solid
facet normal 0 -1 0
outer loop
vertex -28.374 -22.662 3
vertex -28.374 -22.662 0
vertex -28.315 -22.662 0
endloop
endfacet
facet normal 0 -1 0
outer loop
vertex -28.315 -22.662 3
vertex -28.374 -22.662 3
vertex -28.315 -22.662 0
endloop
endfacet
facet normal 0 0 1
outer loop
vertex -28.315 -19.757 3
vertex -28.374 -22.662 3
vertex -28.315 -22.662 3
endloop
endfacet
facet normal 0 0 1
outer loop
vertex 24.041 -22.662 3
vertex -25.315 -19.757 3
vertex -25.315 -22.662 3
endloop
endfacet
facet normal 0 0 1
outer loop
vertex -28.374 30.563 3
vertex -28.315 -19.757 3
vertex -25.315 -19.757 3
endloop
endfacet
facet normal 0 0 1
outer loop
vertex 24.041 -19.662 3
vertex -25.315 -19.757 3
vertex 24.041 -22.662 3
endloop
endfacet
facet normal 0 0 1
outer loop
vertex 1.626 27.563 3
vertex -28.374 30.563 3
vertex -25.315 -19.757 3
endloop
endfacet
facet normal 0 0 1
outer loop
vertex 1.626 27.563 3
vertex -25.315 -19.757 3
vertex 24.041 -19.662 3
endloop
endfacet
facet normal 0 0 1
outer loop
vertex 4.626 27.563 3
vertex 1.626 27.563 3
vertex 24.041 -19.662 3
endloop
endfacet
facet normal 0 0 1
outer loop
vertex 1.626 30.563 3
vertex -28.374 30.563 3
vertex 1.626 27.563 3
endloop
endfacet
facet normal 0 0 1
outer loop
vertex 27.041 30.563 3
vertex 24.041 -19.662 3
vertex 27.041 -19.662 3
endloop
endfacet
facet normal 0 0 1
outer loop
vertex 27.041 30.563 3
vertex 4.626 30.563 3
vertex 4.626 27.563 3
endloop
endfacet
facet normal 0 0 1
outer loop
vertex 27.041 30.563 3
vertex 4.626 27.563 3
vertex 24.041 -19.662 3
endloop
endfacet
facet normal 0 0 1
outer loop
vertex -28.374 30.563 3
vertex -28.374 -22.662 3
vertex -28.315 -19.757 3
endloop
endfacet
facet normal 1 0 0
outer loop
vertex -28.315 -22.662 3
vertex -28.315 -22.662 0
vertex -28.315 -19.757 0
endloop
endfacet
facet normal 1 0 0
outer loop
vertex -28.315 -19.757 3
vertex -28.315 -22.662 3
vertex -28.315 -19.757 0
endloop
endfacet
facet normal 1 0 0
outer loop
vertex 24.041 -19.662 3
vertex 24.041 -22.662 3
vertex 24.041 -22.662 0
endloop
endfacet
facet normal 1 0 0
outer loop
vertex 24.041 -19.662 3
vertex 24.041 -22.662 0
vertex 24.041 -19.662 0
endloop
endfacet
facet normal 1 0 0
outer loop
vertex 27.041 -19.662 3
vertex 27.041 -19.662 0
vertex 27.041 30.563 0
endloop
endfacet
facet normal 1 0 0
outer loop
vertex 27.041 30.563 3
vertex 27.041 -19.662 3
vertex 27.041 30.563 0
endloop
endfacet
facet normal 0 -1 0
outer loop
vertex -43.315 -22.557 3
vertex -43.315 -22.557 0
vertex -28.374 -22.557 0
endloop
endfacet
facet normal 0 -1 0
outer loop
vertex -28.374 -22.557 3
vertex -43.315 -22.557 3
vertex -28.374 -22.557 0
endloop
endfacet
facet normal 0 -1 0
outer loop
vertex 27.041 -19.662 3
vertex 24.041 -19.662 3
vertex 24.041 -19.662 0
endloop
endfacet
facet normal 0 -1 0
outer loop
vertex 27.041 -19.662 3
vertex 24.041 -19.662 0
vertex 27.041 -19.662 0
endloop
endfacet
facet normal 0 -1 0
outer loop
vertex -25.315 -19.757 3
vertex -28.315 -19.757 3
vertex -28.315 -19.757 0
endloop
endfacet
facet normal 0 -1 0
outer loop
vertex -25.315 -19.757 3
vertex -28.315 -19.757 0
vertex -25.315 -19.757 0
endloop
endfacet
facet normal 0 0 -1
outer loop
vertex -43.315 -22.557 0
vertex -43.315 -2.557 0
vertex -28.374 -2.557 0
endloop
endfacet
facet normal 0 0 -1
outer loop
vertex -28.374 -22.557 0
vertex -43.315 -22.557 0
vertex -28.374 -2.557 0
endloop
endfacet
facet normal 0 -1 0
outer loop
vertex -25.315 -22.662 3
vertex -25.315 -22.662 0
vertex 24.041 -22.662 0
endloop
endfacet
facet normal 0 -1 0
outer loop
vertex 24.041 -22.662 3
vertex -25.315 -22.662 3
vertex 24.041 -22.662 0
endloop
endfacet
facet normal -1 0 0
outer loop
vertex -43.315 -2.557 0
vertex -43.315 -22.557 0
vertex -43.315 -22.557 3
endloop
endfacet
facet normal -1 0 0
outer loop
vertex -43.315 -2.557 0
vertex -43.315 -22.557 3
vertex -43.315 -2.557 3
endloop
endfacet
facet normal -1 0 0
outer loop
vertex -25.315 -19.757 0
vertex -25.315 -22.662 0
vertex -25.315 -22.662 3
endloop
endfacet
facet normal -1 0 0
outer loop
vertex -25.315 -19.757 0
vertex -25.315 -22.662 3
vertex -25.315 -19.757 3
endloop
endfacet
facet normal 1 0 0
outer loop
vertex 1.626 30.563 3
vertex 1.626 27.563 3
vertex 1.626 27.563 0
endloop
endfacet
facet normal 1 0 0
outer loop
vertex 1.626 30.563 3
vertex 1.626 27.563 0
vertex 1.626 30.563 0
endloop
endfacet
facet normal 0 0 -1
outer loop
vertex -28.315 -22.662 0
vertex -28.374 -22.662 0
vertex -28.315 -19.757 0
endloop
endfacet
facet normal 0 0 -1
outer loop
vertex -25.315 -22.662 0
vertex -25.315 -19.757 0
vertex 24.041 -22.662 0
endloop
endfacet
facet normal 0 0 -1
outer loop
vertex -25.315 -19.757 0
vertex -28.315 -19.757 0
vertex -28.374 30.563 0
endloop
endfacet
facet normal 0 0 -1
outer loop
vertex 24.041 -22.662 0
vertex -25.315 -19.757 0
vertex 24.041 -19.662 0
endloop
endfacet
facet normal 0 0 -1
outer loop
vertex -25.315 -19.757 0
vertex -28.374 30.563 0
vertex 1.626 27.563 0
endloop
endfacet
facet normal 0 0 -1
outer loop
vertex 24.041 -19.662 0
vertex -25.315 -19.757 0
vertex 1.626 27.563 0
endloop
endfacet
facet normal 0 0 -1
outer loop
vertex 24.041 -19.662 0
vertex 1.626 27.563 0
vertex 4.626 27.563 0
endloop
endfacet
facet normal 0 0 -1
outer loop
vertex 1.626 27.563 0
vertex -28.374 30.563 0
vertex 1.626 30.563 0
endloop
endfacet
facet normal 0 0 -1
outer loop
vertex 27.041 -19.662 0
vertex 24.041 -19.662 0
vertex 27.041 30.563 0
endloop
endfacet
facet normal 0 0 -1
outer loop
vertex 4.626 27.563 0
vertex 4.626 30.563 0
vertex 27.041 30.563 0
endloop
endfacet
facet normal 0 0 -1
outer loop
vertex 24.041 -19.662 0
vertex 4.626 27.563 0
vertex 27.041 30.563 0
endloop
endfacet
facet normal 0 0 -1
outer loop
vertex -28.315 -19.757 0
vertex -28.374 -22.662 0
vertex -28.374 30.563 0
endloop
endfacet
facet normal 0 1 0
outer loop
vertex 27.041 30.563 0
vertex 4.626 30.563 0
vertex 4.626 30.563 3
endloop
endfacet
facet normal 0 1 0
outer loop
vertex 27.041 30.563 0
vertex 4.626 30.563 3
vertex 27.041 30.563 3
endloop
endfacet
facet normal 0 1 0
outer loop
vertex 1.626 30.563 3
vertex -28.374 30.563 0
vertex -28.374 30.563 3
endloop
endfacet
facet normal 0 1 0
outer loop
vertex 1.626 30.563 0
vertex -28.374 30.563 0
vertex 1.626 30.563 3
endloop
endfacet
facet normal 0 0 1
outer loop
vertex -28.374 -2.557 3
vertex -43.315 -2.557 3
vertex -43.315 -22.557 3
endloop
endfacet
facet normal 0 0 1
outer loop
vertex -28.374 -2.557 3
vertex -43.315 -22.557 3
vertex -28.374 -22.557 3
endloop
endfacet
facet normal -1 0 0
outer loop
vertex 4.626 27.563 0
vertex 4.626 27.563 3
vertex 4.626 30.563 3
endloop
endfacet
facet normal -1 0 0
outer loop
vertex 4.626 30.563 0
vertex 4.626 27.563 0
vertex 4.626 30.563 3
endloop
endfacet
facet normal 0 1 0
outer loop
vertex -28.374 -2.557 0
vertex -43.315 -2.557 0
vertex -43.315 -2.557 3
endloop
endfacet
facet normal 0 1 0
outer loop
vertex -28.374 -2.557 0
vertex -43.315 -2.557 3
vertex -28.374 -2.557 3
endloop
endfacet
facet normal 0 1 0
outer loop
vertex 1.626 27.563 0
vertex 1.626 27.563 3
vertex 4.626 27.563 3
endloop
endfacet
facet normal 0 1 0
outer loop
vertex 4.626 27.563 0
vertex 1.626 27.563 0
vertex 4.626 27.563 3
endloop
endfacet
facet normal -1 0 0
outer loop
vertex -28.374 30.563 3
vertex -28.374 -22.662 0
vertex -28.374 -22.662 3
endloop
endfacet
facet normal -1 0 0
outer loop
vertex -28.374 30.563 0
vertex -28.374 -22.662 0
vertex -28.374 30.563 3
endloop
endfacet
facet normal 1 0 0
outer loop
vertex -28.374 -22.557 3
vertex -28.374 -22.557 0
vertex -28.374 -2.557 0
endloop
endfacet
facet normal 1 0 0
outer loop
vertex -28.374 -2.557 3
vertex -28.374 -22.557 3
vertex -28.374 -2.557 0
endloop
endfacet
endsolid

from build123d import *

# Parameters (mm, degrees)
F0_W      = 55.4152354598
F0_H      = 53.2255768776
F3_DEPTH  = 3
F1_W      = 14.9404419214
F1_H      = 20
F2_W      = 3
F2_H      = 3
F4_DEPTH  = 8.2
F5_DEPTH  = 11.8
F6_W      = 3
F6_H      = 3
F7_DEPTH  = 18.4
F8_DEPTH  = 18.4
F9_DEPTH  = 11.5
F10_DEPTH = 25


with BuildPart() as f3:
    # F0 (on Top) → F3 (new body)
    with BuildSketch(Plane.XY):
        with Locations((-0.6665214896, 3.9505399764)):
            Rectangle(F0_W, F0_H)
    extrude(amount=F3_DEPTH)

    # F2 (on Top) → F4 (join)
    with BuildSketch(Plane.XY):
        with Locations((3.1258607805, 29.0633284152)):
            Rectangle(F2_W, F2_H)
        with Locations((-26.8145811409, -21.2570906281)):
            Rectangle(F2_W, F2_H)
        with Locations((25.5410962403, -21.1622484624)):
            Rectangle(F2_W, F2_H)
    extrude(amount=F4_DEPTH)

    # F5 (add): a face of the model
    f5_faces = [f3.faces().sort_by_distance(p)[0] for p in [
        (3.1258607805, 29.0633284152, 8.2),
    ]]
    extrude(f5_faces, amount=-F5_DEPTH)

    # F6 (on face) → F7 (join)
    with BuildSketch(Plane.XY.offset(8.2)):
        with Locations((3.1258607805, 29.0633284152)):
            Rectangle(F6_W, F6_H)
    extrude(amount=-F7_DEPTH)

    # F8 (cut): a face of the model
    f8_faces = [f3.faces().sort_by_distance(p)[0] for p in [
        (3.1258607805, 29.0633284152, 8.2),
    ]]
    extrude(f8_faces, amount=-F8_DEPTH, mode=Mode.SUBTRACT)

    # F9 (cut): a face of the model
    f9_faces = [f3.faces().sort_by_distance(p)[0] for p in [
        (-26.8145811409, -21.2570906281, 8.2),
    ]]
    extrude(f9_faces, amount=-F9_DEPTH, mode=Mode.SUBTRACT)

    # F10 (cut): a face of the model
    f10_faces = [f3.faces().sort_by_distance(p)[0] for p in [
        (25.5410962403, -21.1622484624, 8.2),
    ]]
    extrude(f10_faces, amount=-F10_DEPTH, mode=Mode.SUBTRACT)


with BuildPart() as f3b:
    # F1 (on face) → F3, piece 2 (new body)
    with BuildSketch(Plane.XY):
        with Locations((-35.8443601802, -12.5567854941)):
            Rectangle(F1_W, F1_H)
    extrude(amount=F3_DEPTH)


solid = Compound([f3.part, f3b.part])
